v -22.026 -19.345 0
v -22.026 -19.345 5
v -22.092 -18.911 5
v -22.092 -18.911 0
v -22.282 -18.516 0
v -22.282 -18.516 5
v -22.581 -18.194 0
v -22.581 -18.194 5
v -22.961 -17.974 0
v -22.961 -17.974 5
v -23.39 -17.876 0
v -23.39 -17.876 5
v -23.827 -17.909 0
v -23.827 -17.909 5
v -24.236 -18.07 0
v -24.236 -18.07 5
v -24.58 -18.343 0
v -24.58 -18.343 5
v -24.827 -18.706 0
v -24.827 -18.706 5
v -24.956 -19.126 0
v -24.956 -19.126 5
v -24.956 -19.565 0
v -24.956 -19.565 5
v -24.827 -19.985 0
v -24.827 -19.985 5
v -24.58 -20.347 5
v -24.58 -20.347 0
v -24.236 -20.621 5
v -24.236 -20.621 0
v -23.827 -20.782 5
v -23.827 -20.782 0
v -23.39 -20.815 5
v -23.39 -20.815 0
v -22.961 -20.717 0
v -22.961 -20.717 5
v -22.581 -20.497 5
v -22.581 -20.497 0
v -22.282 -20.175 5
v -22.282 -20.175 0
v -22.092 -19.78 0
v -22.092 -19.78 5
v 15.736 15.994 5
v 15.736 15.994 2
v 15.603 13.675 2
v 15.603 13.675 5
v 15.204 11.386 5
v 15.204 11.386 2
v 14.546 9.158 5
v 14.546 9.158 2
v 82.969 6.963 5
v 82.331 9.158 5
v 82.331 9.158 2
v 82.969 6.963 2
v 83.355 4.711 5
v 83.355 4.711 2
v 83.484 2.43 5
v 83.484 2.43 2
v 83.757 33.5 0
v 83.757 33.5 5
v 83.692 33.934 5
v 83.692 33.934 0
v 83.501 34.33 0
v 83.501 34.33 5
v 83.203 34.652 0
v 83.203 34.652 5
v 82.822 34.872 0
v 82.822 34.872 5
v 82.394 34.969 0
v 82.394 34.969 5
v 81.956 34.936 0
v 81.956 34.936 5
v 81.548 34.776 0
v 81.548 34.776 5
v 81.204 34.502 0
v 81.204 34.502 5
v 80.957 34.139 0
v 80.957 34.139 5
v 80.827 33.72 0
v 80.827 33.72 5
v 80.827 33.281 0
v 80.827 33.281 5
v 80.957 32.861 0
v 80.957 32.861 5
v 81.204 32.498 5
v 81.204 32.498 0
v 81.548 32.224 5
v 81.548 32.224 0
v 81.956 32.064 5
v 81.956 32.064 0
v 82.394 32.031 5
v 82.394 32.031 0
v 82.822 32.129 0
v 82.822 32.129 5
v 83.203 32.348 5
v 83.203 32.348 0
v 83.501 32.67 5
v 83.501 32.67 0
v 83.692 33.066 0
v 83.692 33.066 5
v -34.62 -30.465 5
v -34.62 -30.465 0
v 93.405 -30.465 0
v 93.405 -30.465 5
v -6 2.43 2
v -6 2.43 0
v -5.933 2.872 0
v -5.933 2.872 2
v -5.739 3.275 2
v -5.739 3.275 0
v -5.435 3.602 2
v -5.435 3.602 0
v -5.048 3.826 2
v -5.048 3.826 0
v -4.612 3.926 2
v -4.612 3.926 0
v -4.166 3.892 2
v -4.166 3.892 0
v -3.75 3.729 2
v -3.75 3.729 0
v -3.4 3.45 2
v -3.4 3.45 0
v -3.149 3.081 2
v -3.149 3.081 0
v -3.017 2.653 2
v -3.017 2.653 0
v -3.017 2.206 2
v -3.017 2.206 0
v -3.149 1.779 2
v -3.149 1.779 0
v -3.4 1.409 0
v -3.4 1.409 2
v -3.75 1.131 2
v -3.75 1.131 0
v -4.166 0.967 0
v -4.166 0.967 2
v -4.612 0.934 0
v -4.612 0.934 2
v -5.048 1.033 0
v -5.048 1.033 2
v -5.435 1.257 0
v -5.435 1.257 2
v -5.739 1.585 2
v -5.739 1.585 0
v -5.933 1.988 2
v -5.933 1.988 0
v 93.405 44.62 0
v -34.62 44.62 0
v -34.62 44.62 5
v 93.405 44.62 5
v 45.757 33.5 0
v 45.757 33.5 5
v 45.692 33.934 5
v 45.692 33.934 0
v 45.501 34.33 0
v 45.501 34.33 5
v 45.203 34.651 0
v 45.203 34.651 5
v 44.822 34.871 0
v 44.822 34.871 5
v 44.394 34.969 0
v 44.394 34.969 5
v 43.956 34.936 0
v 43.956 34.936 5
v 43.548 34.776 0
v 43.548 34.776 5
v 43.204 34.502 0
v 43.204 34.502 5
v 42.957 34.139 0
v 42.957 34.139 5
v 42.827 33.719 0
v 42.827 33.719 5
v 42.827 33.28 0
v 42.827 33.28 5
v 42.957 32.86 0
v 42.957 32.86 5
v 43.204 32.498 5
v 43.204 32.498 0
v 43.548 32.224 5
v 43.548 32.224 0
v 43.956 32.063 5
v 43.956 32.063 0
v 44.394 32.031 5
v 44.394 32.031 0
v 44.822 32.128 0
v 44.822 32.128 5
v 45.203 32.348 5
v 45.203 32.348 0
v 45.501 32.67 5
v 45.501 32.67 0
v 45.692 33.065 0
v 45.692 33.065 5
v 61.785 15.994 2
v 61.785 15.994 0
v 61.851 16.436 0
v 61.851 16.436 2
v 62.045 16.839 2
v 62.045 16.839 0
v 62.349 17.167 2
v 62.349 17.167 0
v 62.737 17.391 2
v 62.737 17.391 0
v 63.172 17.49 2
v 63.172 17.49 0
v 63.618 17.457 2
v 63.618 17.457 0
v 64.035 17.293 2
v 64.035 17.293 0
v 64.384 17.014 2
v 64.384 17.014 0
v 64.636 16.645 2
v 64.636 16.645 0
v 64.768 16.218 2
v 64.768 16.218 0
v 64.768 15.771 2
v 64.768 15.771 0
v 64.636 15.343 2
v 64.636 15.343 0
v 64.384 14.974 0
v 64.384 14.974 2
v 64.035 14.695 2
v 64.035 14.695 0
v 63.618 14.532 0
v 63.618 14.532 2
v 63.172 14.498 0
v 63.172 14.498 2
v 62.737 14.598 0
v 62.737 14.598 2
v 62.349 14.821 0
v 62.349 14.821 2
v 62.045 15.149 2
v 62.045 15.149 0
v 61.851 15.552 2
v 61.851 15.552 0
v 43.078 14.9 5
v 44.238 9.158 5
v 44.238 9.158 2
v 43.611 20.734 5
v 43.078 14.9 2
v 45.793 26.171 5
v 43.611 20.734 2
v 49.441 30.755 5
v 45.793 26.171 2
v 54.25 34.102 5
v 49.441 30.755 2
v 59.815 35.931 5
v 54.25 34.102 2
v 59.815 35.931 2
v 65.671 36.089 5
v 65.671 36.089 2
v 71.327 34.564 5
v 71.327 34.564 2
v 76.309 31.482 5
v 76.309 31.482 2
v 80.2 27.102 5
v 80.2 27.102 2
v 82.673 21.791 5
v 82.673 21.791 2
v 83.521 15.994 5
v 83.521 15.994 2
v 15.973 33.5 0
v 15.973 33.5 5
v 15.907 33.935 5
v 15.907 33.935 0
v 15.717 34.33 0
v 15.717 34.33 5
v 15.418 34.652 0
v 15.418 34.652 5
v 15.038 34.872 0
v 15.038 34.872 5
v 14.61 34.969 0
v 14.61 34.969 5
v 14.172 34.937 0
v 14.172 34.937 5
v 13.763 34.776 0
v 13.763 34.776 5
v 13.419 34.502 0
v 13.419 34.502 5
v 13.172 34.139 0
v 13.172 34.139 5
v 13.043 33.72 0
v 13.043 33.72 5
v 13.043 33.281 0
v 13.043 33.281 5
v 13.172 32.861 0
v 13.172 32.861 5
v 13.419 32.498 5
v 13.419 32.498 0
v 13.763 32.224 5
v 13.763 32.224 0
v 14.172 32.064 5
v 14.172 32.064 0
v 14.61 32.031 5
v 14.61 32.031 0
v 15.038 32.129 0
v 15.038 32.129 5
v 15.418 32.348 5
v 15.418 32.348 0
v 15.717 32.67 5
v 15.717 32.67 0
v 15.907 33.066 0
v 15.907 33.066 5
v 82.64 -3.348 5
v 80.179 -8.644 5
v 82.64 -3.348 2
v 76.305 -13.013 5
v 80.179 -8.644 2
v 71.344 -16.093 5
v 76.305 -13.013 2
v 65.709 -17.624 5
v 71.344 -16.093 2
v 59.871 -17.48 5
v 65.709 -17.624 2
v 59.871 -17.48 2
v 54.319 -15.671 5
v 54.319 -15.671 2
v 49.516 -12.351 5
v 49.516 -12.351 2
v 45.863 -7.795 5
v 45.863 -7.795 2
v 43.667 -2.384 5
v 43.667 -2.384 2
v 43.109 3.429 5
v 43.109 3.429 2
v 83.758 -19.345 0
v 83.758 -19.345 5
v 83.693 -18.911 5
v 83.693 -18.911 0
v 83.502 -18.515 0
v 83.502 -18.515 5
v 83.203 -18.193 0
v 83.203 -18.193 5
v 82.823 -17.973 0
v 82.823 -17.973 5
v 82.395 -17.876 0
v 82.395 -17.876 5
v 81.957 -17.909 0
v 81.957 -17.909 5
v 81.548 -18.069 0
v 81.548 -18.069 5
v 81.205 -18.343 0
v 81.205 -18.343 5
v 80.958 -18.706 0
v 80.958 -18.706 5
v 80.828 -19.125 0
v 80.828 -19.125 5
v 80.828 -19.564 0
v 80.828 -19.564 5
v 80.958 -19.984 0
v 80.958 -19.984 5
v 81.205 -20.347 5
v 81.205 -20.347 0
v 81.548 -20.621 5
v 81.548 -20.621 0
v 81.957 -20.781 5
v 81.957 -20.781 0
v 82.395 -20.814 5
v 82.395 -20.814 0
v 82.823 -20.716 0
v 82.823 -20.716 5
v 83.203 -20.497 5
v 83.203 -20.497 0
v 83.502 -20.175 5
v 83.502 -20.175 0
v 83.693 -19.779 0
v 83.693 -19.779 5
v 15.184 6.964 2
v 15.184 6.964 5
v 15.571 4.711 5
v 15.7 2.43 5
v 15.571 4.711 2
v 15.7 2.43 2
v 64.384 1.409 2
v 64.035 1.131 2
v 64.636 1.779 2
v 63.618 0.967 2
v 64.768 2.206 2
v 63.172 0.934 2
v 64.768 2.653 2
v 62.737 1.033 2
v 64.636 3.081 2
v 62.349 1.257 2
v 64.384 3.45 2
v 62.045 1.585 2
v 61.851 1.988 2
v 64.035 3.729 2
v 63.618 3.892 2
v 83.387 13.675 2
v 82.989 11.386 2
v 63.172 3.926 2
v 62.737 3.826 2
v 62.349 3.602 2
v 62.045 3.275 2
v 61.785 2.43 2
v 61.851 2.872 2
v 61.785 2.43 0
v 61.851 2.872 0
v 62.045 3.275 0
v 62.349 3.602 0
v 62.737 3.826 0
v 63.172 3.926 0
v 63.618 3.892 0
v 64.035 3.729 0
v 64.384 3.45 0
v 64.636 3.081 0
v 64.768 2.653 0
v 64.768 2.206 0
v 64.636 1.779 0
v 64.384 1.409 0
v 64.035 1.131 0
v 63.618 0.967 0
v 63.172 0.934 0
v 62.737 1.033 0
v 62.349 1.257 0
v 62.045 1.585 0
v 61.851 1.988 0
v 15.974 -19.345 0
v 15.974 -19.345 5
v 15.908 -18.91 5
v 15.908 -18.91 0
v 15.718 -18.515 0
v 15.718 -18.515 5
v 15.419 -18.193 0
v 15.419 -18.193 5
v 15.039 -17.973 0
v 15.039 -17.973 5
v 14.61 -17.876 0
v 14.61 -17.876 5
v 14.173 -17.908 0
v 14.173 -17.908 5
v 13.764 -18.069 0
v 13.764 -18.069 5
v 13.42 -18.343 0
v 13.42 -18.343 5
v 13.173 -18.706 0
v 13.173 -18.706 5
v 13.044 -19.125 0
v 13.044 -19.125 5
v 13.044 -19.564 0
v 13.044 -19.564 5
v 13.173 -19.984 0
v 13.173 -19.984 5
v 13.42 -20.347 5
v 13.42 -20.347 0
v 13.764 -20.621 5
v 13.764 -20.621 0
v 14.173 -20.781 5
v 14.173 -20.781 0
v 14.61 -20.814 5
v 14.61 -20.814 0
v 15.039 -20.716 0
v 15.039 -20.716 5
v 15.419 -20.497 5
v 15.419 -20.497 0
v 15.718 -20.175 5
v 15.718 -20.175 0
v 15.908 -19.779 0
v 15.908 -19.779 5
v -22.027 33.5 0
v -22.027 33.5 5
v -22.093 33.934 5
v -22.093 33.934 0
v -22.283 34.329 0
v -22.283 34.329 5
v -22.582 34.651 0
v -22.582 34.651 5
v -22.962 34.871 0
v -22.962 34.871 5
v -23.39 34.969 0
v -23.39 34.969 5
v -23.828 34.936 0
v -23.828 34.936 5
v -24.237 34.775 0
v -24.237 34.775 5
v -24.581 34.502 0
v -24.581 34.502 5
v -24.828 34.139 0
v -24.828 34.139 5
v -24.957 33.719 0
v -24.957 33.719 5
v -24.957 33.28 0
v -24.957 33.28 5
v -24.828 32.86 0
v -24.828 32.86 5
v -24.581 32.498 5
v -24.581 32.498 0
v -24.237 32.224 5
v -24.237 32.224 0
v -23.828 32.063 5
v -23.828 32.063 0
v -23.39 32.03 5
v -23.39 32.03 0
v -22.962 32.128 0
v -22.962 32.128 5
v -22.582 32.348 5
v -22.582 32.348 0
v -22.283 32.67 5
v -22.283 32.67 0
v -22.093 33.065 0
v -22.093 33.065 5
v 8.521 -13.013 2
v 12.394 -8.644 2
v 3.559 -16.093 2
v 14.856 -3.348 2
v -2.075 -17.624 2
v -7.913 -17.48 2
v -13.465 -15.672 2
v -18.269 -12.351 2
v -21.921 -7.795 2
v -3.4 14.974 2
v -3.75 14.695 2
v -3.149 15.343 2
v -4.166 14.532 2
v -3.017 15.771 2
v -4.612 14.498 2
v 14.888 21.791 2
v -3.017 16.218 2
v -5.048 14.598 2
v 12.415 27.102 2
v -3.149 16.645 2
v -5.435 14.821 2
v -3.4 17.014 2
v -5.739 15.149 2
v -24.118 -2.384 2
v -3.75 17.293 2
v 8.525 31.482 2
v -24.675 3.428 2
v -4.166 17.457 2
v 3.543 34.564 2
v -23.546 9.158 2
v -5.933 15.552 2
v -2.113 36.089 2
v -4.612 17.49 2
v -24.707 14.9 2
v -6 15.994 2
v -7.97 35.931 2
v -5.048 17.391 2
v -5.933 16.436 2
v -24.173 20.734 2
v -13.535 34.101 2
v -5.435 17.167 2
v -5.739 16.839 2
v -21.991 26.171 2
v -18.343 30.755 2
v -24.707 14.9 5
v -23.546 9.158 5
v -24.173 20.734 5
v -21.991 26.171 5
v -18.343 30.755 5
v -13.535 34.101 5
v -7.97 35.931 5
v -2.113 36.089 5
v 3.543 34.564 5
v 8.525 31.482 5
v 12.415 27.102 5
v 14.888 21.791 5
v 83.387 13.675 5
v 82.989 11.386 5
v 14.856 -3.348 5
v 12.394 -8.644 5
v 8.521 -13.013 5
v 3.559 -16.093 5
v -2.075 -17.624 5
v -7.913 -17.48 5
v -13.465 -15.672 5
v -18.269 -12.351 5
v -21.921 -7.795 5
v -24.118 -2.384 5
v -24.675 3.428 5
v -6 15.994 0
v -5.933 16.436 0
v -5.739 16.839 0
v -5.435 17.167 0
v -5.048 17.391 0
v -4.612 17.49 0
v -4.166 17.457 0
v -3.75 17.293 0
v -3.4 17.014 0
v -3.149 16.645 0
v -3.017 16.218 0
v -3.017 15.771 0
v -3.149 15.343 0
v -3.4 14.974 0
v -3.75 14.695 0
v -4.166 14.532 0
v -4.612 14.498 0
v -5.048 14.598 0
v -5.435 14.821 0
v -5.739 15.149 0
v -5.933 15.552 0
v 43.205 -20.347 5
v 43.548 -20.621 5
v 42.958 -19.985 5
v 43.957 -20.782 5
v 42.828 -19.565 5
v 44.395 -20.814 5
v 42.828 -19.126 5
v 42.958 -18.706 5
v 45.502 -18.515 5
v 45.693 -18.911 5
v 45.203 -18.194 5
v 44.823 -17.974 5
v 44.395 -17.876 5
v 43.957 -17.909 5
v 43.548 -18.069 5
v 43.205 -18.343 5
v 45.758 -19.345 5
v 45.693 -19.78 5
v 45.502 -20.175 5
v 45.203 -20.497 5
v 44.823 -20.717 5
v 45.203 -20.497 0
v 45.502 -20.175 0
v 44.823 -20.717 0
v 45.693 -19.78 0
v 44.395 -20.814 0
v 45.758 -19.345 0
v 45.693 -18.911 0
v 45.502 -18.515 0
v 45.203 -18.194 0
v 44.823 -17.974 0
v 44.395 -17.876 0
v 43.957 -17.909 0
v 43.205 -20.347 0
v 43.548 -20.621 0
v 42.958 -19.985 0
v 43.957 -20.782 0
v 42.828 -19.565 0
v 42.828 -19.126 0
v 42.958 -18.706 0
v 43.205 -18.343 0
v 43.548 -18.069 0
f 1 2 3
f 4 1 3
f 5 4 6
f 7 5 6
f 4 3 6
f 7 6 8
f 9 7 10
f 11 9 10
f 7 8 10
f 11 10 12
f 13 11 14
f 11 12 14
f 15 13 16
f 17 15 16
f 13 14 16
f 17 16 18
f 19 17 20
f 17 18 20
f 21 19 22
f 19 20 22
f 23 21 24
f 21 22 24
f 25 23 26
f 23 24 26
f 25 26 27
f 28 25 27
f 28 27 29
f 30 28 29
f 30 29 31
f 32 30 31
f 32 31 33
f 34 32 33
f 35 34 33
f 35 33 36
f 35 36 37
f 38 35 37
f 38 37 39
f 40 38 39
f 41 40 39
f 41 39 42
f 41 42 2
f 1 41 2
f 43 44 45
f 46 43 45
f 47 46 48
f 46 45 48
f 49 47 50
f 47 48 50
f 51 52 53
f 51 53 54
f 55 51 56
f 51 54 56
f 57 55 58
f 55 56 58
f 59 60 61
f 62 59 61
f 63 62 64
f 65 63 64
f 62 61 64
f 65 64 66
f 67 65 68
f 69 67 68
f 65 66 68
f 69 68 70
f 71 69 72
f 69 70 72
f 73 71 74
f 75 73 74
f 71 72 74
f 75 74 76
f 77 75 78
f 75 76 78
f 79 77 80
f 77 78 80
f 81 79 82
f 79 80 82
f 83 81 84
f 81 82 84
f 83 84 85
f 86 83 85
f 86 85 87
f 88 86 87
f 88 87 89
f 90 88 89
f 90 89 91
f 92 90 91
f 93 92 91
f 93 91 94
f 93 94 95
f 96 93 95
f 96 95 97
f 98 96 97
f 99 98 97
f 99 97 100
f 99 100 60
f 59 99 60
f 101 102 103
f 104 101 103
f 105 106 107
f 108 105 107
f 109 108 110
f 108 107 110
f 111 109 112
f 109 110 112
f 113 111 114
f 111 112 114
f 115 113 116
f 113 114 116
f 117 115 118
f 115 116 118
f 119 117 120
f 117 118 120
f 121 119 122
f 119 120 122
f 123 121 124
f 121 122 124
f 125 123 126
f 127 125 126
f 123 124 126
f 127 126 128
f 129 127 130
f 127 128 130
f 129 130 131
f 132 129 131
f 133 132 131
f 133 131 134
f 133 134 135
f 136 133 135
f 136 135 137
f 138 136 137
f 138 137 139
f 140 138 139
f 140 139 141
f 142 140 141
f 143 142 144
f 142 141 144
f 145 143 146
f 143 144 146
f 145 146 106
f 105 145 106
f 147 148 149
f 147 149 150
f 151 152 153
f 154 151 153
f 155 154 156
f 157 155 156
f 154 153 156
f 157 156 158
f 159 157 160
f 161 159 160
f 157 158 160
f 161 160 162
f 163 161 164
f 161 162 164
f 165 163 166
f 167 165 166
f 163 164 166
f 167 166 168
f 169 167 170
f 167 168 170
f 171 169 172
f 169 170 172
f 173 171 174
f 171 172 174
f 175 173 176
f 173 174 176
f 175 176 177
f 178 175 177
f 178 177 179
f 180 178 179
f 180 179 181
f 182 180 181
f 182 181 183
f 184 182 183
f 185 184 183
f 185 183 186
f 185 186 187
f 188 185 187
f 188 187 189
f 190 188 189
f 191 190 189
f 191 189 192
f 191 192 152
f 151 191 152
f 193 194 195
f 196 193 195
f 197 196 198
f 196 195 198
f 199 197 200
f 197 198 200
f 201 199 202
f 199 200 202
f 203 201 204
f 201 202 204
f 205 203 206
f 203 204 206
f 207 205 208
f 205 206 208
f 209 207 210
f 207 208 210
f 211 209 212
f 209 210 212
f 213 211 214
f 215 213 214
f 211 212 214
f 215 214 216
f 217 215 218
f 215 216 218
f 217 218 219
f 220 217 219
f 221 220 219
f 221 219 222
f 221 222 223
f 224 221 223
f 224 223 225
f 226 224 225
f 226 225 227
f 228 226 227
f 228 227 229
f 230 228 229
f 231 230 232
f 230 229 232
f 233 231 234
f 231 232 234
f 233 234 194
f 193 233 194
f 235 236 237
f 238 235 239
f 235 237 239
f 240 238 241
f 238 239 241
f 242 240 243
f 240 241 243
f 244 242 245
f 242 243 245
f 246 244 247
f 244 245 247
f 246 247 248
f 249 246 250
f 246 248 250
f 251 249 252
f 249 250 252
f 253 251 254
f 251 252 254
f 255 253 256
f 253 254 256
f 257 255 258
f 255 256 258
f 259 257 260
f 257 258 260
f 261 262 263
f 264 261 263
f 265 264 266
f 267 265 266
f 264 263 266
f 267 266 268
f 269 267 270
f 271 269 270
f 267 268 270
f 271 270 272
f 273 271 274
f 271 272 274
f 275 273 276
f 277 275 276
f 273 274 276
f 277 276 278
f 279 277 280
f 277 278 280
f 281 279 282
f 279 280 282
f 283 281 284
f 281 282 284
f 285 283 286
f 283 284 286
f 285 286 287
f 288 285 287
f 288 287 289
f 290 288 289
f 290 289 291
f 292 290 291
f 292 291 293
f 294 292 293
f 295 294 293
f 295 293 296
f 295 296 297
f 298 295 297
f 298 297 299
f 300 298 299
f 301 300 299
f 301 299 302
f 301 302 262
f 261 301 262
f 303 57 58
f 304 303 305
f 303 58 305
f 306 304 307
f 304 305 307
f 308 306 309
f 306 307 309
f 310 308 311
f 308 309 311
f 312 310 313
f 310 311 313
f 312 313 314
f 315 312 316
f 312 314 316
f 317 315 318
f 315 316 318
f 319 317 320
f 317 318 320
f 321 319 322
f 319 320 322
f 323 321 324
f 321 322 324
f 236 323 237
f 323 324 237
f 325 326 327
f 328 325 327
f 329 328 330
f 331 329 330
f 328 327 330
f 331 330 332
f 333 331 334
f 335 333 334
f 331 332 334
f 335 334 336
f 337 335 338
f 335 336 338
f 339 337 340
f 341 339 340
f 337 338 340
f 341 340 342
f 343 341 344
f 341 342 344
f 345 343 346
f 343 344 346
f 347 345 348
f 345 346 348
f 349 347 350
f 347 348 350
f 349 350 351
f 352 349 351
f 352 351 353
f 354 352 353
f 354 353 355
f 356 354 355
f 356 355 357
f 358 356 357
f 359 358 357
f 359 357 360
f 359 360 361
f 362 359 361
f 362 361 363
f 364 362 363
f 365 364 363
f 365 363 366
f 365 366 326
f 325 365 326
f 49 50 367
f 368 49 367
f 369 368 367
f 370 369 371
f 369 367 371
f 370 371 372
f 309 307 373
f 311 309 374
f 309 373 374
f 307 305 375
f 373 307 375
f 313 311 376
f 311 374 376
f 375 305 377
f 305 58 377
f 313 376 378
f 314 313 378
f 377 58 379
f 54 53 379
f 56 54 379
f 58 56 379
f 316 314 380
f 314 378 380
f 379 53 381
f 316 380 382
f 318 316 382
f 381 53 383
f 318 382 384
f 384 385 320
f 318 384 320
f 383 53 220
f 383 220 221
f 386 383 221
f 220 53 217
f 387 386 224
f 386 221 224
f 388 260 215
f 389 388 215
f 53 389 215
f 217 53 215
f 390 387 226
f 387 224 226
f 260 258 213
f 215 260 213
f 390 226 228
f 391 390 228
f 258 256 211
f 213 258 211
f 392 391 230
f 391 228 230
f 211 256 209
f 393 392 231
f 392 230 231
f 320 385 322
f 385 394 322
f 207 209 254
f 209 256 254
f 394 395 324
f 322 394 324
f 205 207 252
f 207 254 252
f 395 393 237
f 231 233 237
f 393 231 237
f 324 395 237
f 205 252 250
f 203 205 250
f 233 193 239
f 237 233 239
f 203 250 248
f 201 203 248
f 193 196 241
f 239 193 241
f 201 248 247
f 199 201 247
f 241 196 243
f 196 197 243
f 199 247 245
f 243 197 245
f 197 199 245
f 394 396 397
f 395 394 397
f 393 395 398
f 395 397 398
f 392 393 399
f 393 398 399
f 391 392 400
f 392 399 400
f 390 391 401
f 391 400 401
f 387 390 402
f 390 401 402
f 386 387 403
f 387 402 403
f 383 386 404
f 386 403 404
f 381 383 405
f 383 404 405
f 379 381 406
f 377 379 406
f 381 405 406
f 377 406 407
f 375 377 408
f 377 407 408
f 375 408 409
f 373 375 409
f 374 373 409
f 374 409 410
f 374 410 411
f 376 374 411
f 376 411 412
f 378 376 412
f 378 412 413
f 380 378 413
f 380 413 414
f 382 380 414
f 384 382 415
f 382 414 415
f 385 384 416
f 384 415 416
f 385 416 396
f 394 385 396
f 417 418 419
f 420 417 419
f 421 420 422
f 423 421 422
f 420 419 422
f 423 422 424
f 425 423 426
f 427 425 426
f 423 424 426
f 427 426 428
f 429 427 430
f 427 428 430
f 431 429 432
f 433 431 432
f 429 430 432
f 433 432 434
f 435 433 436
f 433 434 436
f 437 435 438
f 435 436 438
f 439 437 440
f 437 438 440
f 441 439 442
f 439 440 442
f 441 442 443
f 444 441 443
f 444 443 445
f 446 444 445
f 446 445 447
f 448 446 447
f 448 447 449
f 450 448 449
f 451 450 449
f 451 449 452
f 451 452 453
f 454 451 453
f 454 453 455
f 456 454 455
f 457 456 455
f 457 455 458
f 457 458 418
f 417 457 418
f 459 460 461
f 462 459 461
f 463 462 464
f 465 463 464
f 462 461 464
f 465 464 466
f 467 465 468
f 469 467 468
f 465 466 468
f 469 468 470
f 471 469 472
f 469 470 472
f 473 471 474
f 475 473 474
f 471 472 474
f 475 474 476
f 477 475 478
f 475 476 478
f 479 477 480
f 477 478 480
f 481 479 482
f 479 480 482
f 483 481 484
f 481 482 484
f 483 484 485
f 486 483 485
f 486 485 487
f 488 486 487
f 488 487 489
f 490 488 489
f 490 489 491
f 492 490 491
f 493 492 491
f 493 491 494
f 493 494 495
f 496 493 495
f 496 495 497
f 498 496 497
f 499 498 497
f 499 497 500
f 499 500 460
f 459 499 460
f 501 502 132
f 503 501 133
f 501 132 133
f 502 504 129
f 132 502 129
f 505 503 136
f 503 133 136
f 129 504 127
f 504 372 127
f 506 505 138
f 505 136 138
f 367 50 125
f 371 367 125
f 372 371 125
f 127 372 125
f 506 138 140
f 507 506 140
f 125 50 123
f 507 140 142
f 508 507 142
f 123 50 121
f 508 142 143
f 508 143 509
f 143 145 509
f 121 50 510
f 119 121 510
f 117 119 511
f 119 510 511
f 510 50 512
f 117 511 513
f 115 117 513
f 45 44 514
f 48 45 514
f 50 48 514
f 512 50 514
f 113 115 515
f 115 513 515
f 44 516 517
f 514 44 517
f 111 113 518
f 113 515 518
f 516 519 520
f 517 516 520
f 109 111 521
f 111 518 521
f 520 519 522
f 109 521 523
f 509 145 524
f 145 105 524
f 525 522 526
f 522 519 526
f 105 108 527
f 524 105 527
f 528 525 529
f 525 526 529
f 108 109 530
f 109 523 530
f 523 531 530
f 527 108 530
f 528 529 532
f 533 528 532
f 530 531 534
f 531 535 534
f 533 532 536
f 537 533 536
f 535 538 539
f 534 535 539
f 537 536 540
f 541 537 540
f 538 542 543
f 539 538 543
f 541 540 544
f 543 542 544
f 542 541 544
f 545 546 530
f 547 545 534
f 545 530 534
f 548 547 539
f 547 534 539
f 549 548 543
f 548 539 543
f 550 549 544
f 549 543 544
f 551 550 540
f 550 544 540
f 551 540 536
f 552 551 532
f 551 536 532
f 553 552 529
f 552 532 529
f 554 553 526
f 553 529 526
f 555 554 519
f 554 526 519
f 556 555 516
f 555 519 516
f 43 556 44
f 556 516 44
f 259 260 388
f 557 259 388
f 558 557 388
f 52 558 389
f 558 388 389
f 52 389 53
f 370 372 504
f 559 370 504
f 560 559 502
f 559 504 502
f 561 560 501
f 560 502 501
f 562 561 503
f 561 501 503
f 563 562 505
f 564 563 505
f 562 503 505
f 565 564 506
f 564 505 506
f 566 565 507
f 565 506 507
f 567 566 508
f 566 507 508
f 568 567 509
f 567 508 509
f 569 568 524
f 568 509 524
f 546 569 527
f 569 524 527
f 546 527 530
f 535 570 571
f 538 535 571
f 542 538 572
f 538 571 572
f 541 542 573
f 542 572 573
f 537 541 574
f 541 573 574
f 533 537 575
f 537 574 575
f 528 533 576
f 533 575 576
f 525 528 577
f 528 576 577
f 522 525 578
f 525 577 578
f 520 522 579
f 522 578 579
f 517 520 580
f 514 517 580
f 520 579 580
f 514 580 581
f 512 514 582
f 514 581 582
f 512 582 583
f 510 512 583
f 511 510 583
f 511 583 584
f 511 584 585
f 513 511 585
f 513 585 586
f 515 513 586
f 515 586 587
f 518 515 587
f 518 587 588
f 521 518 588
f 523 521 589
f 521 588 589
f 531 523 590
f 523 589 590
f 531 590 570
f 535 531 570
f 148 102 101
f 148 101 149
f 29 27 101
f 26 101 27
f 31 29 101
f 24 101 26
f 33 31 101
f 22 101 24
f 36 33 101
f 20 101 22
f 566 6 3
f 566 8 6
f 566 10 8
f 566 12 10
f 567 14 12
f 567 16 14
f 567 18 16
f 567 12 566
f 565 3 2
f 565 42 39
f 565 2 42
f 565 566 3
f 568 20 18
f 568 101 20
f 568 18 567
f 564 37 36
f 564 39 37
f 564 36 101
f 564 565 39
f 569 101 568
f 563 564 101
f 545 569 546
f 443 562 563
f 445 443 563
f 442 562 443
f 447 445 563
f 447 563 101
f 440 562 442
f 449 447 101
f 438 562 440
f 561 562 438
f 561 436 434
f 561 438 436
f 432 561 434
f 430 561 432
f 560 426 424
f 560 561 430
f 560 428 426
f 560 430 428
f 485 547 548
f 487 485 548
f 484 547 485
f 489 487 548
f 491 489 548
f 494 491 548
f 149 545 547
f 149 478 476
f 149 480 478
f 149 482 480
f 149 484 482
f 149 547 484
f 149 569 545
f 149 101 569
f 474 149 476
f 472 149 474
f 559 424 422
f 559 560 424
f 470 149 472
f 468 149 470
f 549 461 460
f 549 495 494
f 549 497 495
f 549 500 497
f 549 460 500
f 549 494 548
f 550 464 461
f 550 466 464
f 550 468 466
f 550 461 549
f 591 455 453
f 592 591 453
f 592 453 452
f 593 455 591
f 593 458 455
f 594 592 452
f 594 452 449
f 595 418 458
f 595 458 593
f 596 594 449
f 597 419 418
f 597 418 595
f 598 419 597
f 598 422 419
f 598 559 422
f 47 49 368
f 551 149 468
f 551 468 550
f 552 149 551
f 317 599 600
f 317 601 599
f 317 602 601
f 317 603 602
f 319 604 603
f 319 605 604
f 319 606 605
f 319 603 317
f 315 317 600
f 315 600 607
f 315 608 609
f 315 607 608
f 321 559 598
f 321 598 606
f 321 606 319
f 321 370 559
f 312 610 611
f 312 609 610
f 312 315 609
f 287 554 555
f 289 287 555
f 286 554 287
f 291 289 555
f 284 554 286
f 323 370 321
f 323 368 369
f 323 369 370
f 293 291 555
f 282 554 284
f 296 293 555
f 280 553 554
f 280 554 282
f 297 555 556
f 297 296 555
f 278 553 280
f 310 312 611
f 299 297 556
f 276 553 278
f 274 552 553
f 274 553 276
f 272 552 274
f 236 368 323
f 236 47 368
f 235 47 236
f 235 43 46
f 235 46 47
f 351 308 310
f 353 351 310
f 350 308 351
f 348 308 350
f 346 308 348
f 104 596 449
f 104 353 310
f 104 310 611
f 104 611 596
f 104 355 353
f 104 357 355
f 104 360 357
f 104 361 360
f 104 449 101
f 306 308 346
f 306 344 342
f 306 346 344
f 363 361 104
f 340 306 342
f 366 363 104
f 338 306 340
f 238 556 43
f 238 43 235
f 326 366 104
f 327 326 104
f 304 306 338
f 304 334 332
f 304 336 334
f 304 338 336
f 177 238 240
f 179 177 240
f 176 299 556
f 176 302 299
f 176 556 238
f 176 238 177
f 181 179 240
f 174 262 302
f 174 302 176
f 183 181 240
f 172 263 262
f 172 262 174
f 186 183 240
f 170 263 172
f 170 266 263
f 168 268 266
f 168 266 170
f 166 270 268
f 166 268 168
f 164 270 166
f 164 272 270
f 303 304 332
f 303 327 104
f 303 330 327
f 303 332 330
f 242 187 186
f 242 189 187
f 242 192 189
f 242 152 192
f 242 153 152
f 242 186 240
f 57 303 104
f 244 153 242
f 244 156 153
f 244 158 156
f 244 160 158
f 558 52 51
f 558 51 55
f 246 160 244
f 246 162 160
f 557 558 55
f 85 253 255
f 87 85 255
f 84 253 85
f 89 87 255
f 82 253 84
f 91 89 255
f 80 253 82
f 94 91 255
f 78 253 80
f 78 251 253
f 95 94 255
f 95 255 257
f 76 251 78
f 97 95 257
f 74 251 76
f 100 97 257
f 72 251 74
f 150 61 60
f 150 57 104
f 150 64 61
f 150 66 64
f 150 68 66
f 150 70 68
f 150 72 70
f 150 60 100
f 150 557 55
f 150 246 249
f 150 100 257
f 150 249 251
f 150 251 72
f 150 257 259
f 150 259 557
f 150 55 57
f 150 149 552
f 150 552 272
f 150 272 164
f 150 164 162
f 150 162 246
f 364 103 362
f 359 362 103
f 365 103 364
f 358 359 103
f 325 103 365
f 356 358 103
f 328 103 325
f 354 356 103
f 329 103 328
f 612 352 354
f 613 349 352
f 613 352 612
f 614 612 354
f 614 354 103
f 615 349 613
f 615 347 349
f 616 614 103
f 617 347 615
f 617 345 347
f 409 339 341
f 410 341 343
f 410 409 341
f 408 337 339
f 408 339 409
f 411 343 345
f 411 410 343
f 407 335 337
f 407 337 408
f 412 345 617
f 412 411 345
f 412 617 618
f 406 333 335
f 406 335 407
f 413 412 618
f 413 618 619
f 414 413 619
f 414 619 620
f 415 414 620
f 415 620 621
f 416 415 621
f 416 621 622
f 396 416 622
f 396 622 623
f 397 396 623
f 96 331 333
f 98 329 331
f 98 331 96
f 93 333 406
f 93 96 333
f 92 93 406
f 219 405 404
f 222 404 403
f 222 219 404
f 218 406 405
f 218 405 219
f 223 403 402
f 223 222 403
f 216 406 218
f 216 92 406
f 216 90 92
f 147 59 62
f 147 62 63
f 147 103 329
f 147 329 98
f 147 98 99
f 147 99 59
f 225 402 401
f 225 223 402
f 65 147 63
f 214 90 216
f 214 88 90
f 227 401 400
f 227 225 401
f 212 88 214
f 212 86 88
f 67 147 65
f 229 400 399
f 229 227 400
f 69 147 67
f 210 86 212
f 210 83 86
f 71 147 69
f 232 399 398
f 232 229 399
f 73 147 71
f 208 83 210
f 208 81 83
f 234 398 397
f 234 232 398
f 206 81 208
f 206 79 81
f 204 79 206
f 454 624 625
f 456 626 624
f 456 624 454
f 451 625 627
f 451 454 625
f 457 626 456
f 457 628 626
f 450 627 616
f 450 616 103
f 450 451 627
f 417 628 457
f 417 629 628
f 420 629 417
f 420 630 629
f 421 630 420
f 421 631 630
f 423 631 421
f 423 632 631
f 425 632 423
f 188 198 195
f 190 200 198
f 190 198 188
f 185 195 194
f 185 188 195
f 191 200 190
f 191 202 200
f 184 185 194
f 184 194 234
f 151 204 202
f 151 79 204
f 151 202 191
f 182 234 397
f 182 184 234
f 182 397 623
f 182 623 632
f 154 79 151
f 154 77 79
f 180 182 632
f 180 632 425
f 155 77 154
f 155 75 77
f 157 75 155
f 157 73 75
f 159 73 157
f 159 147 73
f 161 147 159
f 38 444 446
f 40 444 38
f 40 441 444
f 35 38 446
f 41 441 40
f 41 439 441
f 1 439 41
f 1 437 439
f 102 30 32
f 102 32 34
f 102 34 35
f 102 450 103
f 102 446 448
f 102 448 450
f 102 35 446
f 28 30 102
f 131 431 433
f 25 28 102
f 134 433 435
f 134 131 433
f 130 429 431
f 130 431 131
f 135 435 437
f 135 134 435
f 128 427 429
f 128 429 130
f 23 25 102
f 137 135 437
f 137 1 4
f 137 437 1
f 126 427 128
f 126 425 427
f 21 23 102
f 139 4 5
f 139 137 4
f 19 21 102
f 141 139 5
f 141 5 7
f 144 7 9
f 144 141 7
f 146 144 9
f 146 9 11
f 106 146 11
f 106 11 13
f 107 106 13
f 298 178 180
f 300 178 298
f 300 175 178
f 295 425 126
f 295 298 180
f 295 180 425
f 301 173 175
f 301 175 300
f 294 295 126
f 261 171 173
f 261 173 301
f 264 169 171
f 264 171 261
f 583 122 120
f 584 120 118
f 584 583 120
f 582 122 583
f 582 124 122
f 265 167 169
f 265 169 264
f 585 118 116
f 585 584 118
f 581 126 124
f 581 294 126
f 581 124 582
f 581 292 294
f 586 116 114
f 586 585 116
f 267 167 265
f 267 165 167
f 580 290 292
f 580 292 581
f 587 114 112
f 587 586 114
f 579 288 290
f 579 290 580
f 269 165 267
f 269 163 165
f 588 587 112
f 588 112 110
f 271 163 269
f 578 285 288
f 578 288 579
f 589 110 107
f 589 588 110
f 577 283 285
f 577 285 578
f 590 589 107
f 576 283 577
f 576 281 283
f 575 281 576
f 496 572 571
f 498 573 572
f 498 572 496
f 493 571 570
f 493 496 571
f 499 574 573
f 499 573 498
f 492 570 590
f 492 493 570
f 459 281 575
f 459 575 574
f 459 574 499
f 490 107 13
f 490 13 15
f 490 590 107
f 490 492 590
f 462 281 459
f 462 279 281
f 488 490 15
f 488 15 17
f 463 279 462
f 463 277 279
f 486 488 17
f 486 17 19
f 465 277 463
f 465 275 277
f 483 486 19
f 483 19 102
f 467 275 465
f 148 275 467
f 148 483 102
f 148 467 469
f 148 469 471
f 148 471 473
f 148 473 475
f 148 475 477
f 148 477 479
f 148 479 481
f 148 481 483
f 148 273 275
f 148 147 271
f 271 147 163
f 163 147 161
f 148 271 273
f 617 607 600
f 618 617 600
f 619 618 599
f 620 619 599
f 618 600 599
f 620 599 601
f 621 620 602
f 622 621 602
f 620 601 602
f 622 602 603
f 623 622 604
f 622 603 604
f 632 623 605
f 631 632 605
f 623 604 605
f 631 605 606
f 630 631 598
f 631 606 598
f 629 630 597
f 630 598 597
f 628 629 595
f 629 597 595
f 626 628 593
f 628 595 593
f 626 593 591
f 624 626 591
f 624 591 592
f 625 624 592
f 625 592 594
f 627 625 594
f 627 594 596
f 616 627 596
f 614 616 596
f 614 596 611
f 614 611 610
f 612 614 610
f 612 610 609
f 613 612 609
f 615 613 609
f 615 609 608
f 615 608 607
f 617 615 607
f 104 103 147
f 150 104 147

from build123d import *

# Parameters (mm, degrees)
SKETCH1_W           = 64.012274628
SKETCH1_H           = 75.085000506
BOSS_EXTRUDE1_DEPTH = 5
SKETCH7_R           = 1.4732
CUT_EXTRUDE1_DEPTH  = 10
SKETCH8_R           = 1.5
BOSS_EXTRUDE2_DEPTH = 2


with BuildPart() as part:
    # Sketch1 → Boss-Extrude1 (new body)
    # profile 1 of 2: a face of its own
    with BuildSketch(Plane.XY):
        with Locations((61.398411242, 7.077500224)):
            Rectangle(SKETCH1_W, SKETCH1_H)
        with BuildLine():
            ThreePointArc((83.484398078, 2.429730903), (59.871437613, -17.479677368), (44.238109553, 9.157805497))
            ThreePointArc((44.238109553, 9.157805497), (59.81501285, 35.930775127), (83.520814038, 15.994205484))
            ThreePointArc((83.520814038, 15.994205484), (83.22114917, 12.52456978), (82.331029644, 9.157693158))
            ThreePointArc((82.331029644, 9.157693158), (83.193968093, 5.842784333), (83.484398078, 2.429730903))
        make_face(mode=Mode.SUBTRACT)
    # profile 2 of 2: a face of its own
    with BuildSketch(Plane.XY):
        with Locations((-2.613863386, 7.077500224)):
            Rectangle(SKETCH1_W, SKETCH1_H)
        with BuildLine():
            ThreePointArc((15.69984642, 2.429730903), (-7.913055331, -17.479687433), (-23.546481788, 9.157693158))
            ThreePointArc((-23.546481788, 9.157693158), (-7.969677608, 35.930764895), (15.736182375, 15.994205484))
            ThreePointArc((15.736182375, 15.994205484), (15.436527739, 12.524628574), (14.546438303, 9.157805497))
            ThreePointArc((14.546438303, 9.157805497), (15.409406369, 5.842843047), (15.69984642, 2.429730903))
        make_face(mode=Mode.SUBTRACT)
    extrude(amount=BOSS_EXTRUDE1_DEPTH)

    # Sketch7 → Cut-Extrude1 (cut)
    with BuildSketch(Plane.XY.offset(5)):
        with Locations((-23.500584488, 33.499560055)):
            Circle(SKETCH7_R)
        with Locations((14.49941543, 33.50027263)):
            Circle(SKETCH7_R)
        with Locations((-23.49959354, -19.345440441)):
            Circle(SKETCH7_R)
        with Locations((14.500406379, -19.344727866)):
            Circle(SKETCH7_R)
        with Locations((44.284829686, -19.345328379)):
            Circle(SKETCH7_R)
        with Locations((44.284150424, 33.499672122)):
            Circle(SKETCH7_R)
        with Locations((82.284150347, 33.500160568)):
            Circle(SKETCH7_R)
        with Locations((82.284829608, -19.344839933)):
            Circle(SKETCH7_R)
    extrude(amount=-CUT_EXTRUDE1_DEPTH, mode=Mode.SUBTRACT)

    # Sketch8 → Boss-Extrude2 (add)
    # profile 1 of 2: a face of its own
    with BuildSketch(Plane(origin=(0, 0, 0), x_dir=(-1, 0, 0), z_dir=(0, 0, -1))):
        with BuildLine():
            ThreePointArc((-44.238109553, 9.157805497), (-63.284649438, 36.230429762), (-82.331029644, 9.157693158))
            ThreePointArc((-82.331029644, 9.157693158), (-63.284490186, -17.770117418), (-44.238109553, 9.157805497))
        make_face()
        with Locations((-63.284549757, 2.429730903)):
            Circle(SKETCH8_R, mode=Mode.SUBTRACT)
        with Locations((-63.28458976, 15.994205484)):
            Circle(SKETCH8_R, mode=Mode.SUBTRACT)
    # profile 2 of 2: a face of its own
    with BuildSketch(Plane(origin=(0, 0, 0), x_dir=(-1, 0, 0), z_dir=(0, 0, -1))):
        with BuildLine():
            ThreePointArc((23.546481788, 9.157693158), (4.500101582, 36.230429762), (-14.546438303, 9.157805497))
            ThreePointArc((-14.546438303, 9.157805497), (4.49994233, -17.770117418), (23.546481788, 9.157693158))
        make_face()
        with Locations((4.500041904, 15.994205484)):
            Circle(SKETCH8_R, mode=Mode.SUBTRACT)
        with Locations((4.500001901, 2.429730903)):
            Circle(SKETCH8_R, mode=Mode.SUBTRACT)
    extrude(amount=-BOSS_EXTRUDE2_DEPTH)


solid = part.part
